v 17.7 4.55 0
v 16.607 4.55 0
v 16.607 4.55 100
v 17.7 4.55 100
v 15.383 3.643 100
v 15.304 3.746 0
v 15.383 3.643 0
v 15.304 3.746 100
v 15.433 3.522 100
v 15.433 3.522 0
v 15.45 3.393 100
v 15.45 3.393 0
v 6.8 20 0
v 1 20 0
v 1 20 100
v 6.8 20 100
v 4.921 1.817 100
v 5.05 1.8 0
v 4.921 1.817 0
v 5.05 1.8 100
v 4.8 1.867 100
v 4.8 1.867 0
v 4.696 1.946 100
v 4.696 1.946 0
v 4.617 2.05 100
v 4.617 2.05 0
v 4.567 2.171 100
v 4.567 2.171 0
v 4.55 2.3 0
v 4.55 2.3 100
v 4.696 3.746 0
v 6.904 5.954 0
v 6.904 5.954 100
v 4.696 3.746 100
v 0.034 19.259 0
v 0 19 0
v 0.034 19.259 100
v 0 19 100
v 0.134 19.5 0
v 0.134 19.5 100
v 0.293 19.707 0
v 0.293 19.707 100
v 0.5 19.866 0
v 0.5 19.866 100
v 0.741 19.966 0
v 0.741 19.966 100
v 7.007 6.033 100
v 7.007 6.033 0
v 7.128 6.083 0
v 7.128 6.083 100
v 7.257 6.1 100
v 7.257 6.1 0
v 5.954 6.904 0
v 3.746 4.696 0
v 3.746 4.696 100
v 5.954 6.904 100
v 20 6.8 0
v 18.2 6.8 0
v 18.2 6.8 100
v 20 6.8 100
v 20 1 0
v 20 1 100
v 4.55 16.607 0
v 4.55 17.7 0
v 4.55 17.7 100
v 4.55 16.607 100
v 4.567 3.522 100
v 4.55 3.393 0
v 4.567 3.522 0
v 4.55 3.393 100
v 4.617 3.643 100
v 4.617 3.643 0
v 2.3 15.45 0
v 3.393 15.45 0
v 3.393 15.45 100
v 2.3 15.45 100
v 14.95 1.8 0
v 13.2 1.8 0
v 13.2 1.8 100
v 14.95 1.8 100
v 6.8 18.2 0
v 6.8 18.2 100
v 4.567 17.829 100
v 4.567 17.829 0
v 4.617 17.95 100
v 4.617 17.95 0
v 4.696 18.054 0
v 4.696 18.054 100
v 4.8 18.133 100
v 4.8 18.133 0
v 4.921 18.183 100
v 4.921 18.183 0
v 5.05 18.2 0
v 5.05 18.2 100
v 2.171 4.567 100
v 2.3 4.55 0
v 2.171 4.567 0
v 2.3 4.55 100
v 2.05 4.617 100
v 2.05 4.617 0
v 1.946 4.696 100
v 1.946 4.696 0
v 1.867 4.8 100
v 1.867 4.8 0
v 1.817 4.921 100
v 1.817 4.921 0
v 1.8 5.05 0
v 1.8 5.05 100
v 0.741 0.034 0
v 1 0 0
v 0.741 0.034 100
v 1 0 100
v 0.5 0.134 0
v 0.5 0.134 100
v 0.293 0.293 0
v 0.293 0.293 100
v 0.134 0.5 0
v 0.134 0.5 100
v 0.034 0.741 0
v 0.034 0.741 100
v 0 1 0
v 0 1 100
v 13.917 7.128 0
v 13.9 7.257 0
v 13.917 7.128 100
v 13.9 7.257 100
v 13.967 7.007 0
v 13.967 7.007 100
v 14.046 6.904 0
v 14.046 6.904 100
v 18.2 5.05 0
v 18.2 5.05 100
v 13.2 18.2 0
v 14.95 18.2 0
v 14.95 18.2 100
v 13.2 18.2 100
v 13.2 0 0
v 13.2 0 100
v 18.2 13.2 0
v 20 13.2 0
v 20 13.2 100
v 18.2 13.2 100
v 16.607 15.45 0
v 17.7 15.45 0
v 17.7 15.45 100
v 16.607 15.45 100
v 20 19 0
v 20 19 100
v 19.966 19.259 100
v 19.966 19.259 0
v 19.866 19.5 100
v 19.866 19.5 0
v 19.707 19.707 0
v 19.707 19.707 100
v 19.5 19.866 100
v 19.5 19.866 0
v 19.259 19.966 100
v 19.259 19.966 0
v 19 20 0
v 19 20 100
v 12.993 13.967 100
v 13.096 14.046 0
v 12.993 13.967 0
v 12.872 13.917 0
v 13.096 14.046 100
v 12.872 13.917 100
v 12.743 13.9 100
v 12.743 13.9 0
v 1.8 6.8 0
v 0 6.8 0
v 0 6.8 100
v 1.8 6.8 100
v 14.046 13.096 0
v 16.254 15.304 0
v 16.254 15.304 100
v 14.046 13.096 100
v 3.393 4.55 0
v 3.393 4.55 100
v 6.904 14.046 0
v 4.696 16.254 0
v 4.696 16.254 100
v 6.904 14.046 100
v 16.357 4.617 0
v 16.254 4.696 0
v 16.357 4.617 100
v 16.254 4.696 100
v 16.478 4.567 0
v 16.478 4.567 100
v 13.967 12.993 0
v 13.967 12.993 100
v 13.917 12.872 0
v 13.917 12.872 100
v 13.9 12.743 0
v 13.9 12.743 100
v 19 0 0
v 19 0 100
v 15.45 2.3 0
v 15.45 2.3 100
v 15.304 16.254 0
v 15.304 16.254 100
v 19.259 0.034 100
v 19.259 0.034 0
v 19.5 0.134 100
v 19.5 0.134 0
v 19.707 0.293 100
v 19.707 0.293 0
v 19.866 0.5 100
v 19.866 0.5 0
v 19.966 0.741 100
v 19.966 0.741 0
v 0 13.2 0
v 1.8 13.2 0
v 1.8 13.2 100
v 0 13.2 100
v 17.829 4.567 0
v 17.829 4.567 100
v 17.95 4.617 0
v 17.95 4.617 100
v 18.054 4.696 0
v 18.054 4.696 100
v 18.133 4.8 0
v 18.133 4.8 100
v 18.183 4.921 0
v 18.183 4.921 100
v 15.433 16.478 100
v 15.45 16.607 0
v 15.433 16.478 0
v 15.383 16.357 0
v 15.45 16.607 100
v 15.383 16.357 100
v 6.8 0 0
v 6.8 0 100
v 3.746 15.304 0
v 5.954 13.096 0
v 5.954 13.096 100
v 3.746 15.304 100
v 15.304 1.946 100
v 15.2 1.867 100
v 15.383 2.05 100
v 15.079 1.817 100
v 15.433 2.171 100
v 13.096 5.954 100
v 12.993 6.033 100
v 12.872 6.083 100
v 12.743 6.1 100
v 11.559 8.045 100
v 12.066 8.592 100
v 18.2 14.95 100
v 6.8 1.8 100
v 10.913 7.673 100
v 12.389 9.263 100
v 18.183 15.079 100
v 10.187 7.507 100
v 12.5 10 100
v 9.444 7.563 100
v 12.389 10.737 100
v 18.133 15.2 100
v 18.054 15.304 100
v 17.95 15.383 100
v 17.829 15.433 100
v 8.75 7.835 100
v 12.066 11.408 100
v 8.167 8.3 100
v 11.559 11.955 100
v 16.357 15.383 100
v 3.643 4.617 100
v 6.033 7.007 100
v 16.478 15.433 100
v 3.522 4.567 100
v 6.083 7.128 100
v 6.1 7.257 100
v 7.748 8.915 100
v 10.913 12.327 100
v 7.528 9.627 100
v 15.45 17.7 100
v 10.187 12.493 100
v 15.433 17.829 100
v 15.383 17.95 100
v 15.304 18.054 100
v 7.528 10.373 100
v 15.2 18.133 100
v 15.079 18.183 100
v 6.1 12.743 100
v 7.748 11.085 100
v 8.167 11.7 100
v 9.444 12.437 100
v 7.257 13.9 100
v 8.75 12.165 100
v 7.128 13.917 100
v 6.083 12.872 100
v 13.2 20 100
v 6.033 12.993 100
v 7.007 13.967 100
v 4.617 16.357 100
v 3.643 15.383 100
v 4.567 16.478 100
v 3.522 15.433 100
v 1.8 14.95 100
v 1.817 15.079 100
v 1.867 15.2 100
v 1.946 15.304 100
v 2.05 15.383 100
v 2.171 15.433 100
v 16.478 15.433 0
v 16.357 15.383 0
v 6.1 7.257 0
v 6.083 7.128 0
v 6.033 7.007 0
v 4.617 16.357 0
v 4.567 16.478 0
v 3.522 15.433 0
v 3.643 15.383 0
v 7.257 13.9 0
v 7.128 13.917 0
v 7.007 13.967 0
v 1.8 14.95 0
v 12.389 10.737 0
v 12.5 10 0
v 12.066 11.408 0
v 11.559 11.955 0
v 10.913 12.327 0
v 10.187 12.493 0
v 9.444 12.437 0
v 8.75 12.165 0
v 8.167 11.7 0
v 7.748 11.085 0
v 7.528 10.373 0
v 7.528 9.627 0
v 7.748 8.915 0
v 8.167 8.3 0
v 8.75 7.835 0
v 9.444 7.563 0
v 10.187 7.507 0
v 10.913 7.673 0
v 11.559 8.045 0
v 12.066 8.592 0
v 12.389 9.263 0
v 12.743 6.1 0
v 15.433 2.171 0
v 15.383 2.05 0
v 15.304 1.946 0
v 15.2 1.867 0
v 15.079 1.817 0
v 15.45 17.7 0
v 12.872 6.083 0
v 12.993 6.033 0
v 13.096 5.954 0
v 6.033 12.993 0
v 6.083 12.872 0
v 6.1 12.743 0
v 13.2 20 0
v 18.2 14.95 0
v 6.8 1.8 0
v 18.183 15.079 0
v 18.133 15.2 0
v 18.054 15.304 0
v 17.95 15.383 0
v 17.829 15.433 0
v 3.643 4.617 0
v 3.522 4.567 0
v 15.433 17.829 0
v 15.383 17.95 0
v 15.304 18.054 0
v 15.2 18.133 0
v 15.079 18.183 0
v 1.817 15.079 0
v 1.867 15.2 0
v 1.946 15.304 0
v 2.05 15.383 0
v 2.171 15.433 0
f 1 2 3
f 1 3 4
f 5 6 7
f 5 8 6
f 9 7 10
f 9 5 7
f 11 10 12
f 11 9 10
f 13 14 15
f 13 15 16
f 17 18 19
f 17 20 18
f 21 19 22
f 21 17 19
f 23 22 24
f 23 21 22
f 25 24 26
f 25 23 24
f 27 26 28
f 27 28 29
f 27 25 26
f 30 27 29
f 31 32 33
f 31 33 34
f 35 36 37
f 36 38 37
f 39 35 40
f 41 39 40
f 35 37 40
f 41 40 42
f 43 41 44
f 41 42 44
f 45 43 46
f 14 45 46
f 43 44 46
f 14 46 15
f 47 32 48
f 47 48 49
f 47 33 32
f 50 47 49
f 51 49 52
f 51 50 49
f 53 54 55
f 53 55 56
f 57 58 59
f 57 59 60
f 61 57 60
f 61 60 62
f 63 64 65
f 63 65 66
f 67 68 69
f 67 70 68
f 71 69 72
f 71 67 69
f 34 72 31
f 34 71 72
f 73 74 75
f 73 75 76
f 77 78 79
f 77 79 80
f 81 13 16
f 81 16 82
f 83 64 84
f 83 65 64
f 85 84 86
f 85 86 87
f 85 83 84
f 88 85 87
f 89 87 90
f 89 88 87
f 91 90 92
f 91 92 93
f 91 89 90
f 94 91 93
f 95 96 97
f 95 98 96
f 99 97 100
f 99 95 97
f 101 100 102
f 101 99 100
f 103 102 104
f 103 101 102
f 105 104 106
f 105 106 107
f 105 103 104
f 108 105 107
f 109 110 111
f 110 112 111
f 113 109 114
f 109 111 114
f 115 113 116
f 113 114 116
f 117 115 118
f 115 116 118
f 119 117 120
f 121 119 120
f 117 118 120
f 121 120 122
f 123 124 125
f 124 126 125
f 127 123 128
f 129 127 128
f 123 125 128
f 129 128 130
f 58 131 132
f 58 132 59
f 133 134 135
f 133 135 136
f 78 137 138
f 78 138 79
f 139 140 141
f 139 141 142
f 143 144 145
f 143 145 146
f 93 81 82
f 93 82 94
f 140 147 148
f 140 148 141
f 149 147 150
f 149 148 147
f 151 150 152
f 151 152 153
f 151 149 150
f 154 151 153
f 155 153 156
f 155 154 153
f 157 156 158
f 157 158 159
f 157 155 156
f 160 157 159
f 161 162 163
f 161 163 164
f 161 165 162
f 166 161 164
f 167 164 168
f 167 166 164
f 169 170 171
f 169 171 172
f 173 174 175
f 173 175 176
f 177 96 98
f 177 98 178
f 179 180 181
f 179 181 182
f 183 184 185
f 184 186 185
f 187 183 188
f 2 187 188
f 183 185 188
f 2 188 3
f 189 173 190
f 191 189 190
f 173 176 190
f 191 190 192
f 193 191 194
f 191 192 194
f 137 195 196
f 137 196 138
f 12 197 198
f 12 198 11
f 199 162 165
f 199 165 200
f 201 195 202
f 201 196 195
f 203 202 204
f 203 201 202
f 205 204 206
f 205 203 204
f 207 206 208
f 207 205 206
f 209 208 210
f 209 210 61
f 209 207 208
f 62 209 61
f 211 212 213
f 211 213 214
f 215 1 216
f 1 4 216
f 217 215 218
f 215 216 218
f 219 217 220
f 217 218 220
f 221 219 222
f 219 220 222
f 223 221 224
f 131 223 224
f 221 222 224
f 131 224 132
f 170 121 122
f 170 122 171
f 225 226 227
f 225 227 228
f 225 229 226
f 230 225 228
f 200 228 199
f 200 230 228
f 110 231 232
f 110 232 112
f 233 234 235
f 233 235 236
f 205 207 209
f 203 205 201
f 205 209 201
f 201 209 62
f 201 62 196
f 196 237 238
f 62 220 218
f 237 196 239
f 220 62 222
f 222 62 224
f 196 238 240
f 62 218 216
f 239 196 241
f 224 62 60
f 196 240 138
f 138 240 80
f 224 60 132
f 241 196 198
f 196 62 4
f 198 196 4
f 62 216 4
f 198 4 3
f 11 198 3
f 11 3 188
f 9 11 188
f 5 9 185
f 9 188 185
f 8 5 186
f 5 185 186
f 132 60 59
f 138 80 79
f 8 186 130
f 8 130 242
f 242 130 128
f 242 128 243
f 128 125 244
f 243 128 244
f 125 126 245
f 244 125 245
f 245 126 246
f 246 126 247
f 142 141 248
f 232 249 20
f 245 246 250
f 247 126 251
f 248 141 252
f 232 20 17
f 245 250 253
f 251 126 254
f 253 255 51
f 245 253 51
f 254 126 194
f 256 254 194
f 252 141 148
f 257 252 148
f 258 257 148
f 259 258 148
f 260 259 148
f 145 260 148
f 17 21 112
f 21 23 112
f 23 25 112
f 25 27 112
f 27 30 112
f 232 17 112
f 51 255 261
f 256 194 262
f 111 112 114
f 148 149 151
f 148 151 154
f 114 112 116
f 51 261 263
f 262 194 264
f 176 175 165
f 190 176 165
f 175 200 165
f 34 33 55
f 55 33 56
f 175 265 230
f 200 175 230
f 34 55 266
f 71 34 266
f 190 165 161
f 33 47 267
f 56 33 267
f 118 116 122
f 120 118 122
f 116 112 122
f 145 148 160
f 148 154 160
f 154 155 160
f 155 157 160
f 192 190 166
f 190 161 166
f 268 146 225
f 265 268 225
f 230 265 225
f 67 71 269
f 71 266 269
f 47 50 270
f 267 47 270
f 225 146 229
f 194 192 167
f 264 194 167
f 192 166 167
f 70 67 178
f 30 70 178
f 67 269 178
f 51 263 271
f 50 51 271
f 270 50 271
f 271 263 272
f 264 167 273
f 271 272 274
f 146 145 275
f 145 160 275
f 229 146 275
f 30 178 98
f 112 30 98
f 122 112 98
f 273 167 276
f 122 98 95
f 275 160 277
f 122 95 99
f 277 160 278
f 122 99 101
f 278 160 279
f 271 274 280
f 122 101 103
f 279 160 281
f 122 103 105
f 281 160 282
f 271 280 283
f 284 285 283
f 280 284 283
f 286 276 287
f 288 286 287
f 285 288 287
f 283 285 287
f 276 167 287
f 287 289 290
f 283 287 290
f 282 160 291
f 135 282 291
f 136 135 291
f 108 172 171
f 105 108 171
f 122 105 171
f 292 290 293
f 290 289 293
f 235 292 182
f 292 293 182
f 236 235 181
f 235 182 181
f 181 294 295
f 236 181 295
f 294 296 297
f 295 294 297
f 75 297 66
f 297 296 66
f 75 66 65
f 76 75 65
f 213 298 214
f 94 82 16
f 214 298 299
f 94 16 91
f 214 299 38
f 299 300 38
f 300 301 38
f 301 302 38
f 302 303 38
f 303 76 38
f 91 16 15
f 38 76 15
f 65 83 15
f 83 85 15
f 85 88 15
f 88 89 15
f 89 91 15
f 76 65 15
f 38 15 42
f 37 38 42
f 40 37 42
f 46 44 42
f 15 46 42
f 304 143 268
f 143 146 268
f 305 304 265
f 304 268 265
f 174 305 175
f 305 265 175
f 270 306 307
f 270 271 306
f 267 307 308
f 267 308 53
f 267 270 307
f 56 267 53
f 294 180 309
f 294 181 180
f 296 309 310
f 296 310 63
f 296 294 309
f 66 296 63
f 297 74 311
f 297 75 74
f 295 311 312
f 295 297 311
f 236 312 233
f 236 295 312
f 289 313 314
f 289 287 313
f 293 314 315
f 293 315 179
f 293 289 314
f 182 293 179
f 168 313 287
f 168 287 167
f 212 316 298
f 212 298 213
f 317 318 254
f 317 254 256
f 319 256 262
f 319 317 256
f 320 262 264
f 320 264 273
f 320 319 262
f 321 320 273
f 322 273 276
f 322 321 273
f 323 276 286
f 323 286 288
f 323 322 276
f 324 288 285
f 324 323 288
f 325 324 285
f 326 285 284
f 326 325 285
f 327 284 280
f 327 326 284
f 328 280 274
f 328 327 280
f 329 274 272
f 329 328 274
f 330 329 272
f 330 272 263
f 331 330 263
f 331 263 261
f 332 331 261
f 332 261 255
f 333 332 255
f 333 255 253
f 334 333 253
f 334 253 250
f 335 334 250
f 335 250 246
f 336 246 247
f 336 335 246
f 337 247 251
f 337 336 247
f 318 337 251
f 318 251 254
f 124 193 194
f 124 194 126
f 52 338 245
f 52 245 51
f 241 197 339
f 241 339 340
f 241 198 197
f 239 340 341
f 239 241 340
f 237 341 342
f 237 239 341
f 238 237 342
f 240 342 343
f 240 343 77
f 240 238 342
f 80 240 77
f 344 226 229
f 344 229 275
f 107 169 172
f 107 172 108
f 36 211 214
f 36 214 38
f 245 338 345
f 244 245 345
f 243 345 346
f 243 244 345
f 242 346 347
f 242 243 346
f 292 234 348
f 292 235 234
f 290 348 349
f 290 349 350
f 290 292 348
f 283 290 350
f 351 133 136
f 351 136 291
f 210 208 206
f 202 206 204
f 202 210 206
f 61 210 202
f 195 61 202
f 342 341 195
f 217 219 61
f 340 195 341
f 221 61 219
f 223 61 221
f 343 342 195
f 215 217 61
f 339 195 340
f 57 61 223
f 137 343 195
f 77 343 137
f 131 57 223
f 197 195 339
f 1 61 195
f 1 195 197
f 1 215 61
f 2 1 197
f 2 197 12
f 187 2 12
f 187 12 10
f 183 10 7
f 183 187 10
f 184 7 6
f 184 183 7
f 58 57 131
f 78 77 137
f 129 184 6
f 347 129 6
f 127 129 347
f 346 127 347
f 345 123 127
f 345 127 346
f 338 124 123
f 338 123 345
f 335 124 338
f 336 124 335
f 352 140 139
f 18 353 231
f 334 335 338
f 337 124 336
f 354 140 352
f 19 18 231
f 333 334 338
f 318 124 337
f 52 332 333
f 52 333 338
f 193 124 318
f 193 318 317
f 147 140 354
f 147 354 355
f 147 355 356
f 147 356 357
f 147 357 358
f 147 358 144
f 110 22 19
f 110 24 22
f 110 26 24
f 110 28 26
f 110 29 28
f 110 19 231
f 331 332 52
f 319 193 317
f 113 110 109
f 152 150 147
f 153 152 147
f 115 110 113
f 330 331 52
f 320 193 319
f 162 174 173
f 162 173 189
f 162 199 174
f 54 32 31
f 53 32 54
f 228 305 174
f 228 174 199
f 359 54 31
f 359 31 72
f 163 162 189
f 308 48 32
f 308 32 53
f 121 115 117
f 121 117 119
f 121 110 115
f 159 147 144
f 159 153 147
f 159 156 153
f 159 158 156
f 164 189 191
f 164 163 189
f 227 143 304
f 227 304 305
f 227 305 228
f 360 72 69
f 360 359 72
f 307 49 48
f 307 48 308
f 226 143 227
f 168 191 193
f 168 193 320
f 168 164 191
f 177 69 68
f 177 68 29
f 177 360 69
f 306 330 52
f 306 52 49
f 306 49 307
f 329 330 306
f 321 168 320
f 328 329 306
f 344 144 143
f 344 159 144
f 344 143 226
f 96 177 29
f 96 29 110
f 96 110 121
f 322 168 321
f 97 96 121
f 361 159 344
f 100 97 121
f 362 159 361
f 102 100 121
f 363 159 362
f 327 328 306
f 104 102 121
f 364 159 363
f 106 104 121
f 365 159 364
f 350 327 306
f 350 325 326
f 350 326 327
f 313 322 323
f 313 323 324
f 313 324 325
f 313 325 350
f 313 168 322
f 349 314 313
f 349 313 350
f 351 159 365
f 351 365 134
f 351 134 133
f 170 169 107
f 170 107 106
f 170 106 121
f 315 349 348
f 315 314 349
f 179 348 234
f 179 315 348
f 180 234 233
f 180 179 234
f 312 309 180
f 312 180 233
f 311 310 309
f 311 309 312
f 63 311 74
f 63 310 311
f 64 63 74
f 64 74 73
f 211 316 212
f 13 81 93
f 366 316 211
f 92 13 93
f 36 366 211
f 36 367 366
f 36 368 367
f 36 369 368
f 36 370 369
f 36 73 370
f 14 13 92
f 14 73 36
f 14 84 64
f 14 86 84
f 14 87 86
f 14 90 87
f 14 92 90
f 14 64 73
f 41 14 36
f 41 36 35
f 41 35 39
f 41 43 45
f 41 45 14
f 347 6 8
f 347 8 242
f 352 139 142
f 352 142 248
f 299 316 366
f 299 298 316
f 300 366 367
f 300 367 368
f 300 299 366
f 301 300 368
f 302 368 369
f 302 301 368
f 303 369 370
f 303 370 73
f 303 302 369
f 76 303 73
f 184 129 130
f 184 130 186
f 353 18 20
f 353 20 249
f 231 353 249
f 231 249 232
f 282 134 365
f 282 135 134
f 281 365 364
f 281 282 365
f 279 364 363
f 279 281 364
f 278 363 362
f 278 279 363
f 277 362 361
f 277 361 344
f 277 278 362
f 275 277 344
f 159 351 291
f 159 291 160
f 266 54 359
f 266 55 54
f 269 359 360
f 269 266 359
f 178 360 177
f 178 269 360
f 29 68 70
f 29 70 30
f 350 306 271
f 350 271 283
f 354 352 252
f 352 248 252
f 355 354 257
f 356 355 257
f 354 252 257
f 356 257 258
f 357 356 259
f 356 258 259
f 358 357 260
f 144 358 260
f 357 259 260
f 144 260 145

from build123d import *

# Parameters (mm, degrees)
SKETCH1_R           = 2.5
BOSS_EXTRUDE1_DEPTH = 100
FILLET1_R           = 1
FILLET2_R           = 0.5
FILLET3_R           = 0.5
FILLET4_R           = 0.5
FILLET5_R           = 0.5


with BuildPart() as part:
    # Sketch1 → Boss-Extrude1 (new body)
    with BuildSketch(Plane.XY):
        Polygon((13.2, 0), (13.2, 1.8), (15.45, 1.8), (15.45, 3.6), (12.95, 6.1), (7.05, 6.1), (4.55, 3.6), (4.55, 1.8), (6.8, 1.8), (6.8, 0), (0, 0), (0, 6.8), (1.8, 6.8), (1.8, 4.55), (3.6, 4.55), (6.1, 7.05), (6.1, 12.95), (3.6, 15.45), (1.8, 15.45), (1.8, 13.2), (0, 13.2), (0, 20), (6.8, 20), (6.8, 18.2), (4.55, 18.2), (4.55, 16.4), (7.05, 13.9), (12.95, 13.9), (15.45, 16.4), (15.45, 18.2), (13.2, 18.2), (13.2, 20), (20, 20), (20, 13.2), (18.2, 13.2), (18.2, 15.45), (16.4, 15.45), (13.9, 12.95), (13.9, 7.05), (16.4, 4.55), (18.2, 4.55), (18.2, 6.8), (20, 6.8), (20, 0), align=None)
        with Locations((10, 10)):
            Circle(SKETCH1_R, mode=Mode.SUBTRACT)
    extrude(amount=BOSS_EXTRUDE1_DEPTH)

    # Fillet1
    fillet1_edges = [part.edges().sort_by_distance(p)[0] for p in [
        (0, 0, 50),
        (0, 20, 50),
        (20, 20, 50),
        (20, 0, 50),
    ]]
    fillet(fillet1_edges, radius=FILLET1_R)

    # Fillet2
    fillet2_edges = [part.edges().sort_by_distance(p)[0] for p in [
        (4.55, 18.2, 50),
        (4.55, 16.4, 50),
        (7.05, 13.9, 50),
        (12.95, 13.9, 50),
        (15.45, 16.4, 50),
        (15.45, 18.2, 50),
    ]]
    fillet(fillet2_edges, radius=FILLET2_R)

    # Fillet3
    fillet3_edges = [part.edges().sort_by_distance(p)[0] for p in [
        (18.2, 15.45, 50),
        (16.4, 15.45, 50),
        (13.9, 12.95, 50),
        (13.9, 7.05, 50),
        (16.4, 4.55, 50),
        (18.2, 4.55, 50),
    ]]
    fillet(fillet3_edges, radius=FILLET3_R)

    # Fillet4
    fillet4_edges = [part.edges().sort_by_distance(p)[0] for p in [
        (1.8, 4.55, 50),
        (3.6, 4.55, 50),
        (6.1, 7.05, 50),
        (6.1, 12.95, 50),
        (3.6, 15.45, 50),
        (1.8, 15.45, 50),
    ]]
    fillet(fillet4_edges, radius=FILLET4_R)

    # Fillet5
    fillet5_edges = [part.edges().sort_by_distance(p)[0] for p in [
        (15.45, 1.8, 50),
        (15.45, 3.6, 50),
        (12.95, 6.1, 50),
        (7.05, 6.1, 50),
        (4.55, 3.6, 50),
        (4.55, 1.8, 50),
    ]]
    fillet(fillet5_edges, radius=FILLET5_R)


solid = part.part
